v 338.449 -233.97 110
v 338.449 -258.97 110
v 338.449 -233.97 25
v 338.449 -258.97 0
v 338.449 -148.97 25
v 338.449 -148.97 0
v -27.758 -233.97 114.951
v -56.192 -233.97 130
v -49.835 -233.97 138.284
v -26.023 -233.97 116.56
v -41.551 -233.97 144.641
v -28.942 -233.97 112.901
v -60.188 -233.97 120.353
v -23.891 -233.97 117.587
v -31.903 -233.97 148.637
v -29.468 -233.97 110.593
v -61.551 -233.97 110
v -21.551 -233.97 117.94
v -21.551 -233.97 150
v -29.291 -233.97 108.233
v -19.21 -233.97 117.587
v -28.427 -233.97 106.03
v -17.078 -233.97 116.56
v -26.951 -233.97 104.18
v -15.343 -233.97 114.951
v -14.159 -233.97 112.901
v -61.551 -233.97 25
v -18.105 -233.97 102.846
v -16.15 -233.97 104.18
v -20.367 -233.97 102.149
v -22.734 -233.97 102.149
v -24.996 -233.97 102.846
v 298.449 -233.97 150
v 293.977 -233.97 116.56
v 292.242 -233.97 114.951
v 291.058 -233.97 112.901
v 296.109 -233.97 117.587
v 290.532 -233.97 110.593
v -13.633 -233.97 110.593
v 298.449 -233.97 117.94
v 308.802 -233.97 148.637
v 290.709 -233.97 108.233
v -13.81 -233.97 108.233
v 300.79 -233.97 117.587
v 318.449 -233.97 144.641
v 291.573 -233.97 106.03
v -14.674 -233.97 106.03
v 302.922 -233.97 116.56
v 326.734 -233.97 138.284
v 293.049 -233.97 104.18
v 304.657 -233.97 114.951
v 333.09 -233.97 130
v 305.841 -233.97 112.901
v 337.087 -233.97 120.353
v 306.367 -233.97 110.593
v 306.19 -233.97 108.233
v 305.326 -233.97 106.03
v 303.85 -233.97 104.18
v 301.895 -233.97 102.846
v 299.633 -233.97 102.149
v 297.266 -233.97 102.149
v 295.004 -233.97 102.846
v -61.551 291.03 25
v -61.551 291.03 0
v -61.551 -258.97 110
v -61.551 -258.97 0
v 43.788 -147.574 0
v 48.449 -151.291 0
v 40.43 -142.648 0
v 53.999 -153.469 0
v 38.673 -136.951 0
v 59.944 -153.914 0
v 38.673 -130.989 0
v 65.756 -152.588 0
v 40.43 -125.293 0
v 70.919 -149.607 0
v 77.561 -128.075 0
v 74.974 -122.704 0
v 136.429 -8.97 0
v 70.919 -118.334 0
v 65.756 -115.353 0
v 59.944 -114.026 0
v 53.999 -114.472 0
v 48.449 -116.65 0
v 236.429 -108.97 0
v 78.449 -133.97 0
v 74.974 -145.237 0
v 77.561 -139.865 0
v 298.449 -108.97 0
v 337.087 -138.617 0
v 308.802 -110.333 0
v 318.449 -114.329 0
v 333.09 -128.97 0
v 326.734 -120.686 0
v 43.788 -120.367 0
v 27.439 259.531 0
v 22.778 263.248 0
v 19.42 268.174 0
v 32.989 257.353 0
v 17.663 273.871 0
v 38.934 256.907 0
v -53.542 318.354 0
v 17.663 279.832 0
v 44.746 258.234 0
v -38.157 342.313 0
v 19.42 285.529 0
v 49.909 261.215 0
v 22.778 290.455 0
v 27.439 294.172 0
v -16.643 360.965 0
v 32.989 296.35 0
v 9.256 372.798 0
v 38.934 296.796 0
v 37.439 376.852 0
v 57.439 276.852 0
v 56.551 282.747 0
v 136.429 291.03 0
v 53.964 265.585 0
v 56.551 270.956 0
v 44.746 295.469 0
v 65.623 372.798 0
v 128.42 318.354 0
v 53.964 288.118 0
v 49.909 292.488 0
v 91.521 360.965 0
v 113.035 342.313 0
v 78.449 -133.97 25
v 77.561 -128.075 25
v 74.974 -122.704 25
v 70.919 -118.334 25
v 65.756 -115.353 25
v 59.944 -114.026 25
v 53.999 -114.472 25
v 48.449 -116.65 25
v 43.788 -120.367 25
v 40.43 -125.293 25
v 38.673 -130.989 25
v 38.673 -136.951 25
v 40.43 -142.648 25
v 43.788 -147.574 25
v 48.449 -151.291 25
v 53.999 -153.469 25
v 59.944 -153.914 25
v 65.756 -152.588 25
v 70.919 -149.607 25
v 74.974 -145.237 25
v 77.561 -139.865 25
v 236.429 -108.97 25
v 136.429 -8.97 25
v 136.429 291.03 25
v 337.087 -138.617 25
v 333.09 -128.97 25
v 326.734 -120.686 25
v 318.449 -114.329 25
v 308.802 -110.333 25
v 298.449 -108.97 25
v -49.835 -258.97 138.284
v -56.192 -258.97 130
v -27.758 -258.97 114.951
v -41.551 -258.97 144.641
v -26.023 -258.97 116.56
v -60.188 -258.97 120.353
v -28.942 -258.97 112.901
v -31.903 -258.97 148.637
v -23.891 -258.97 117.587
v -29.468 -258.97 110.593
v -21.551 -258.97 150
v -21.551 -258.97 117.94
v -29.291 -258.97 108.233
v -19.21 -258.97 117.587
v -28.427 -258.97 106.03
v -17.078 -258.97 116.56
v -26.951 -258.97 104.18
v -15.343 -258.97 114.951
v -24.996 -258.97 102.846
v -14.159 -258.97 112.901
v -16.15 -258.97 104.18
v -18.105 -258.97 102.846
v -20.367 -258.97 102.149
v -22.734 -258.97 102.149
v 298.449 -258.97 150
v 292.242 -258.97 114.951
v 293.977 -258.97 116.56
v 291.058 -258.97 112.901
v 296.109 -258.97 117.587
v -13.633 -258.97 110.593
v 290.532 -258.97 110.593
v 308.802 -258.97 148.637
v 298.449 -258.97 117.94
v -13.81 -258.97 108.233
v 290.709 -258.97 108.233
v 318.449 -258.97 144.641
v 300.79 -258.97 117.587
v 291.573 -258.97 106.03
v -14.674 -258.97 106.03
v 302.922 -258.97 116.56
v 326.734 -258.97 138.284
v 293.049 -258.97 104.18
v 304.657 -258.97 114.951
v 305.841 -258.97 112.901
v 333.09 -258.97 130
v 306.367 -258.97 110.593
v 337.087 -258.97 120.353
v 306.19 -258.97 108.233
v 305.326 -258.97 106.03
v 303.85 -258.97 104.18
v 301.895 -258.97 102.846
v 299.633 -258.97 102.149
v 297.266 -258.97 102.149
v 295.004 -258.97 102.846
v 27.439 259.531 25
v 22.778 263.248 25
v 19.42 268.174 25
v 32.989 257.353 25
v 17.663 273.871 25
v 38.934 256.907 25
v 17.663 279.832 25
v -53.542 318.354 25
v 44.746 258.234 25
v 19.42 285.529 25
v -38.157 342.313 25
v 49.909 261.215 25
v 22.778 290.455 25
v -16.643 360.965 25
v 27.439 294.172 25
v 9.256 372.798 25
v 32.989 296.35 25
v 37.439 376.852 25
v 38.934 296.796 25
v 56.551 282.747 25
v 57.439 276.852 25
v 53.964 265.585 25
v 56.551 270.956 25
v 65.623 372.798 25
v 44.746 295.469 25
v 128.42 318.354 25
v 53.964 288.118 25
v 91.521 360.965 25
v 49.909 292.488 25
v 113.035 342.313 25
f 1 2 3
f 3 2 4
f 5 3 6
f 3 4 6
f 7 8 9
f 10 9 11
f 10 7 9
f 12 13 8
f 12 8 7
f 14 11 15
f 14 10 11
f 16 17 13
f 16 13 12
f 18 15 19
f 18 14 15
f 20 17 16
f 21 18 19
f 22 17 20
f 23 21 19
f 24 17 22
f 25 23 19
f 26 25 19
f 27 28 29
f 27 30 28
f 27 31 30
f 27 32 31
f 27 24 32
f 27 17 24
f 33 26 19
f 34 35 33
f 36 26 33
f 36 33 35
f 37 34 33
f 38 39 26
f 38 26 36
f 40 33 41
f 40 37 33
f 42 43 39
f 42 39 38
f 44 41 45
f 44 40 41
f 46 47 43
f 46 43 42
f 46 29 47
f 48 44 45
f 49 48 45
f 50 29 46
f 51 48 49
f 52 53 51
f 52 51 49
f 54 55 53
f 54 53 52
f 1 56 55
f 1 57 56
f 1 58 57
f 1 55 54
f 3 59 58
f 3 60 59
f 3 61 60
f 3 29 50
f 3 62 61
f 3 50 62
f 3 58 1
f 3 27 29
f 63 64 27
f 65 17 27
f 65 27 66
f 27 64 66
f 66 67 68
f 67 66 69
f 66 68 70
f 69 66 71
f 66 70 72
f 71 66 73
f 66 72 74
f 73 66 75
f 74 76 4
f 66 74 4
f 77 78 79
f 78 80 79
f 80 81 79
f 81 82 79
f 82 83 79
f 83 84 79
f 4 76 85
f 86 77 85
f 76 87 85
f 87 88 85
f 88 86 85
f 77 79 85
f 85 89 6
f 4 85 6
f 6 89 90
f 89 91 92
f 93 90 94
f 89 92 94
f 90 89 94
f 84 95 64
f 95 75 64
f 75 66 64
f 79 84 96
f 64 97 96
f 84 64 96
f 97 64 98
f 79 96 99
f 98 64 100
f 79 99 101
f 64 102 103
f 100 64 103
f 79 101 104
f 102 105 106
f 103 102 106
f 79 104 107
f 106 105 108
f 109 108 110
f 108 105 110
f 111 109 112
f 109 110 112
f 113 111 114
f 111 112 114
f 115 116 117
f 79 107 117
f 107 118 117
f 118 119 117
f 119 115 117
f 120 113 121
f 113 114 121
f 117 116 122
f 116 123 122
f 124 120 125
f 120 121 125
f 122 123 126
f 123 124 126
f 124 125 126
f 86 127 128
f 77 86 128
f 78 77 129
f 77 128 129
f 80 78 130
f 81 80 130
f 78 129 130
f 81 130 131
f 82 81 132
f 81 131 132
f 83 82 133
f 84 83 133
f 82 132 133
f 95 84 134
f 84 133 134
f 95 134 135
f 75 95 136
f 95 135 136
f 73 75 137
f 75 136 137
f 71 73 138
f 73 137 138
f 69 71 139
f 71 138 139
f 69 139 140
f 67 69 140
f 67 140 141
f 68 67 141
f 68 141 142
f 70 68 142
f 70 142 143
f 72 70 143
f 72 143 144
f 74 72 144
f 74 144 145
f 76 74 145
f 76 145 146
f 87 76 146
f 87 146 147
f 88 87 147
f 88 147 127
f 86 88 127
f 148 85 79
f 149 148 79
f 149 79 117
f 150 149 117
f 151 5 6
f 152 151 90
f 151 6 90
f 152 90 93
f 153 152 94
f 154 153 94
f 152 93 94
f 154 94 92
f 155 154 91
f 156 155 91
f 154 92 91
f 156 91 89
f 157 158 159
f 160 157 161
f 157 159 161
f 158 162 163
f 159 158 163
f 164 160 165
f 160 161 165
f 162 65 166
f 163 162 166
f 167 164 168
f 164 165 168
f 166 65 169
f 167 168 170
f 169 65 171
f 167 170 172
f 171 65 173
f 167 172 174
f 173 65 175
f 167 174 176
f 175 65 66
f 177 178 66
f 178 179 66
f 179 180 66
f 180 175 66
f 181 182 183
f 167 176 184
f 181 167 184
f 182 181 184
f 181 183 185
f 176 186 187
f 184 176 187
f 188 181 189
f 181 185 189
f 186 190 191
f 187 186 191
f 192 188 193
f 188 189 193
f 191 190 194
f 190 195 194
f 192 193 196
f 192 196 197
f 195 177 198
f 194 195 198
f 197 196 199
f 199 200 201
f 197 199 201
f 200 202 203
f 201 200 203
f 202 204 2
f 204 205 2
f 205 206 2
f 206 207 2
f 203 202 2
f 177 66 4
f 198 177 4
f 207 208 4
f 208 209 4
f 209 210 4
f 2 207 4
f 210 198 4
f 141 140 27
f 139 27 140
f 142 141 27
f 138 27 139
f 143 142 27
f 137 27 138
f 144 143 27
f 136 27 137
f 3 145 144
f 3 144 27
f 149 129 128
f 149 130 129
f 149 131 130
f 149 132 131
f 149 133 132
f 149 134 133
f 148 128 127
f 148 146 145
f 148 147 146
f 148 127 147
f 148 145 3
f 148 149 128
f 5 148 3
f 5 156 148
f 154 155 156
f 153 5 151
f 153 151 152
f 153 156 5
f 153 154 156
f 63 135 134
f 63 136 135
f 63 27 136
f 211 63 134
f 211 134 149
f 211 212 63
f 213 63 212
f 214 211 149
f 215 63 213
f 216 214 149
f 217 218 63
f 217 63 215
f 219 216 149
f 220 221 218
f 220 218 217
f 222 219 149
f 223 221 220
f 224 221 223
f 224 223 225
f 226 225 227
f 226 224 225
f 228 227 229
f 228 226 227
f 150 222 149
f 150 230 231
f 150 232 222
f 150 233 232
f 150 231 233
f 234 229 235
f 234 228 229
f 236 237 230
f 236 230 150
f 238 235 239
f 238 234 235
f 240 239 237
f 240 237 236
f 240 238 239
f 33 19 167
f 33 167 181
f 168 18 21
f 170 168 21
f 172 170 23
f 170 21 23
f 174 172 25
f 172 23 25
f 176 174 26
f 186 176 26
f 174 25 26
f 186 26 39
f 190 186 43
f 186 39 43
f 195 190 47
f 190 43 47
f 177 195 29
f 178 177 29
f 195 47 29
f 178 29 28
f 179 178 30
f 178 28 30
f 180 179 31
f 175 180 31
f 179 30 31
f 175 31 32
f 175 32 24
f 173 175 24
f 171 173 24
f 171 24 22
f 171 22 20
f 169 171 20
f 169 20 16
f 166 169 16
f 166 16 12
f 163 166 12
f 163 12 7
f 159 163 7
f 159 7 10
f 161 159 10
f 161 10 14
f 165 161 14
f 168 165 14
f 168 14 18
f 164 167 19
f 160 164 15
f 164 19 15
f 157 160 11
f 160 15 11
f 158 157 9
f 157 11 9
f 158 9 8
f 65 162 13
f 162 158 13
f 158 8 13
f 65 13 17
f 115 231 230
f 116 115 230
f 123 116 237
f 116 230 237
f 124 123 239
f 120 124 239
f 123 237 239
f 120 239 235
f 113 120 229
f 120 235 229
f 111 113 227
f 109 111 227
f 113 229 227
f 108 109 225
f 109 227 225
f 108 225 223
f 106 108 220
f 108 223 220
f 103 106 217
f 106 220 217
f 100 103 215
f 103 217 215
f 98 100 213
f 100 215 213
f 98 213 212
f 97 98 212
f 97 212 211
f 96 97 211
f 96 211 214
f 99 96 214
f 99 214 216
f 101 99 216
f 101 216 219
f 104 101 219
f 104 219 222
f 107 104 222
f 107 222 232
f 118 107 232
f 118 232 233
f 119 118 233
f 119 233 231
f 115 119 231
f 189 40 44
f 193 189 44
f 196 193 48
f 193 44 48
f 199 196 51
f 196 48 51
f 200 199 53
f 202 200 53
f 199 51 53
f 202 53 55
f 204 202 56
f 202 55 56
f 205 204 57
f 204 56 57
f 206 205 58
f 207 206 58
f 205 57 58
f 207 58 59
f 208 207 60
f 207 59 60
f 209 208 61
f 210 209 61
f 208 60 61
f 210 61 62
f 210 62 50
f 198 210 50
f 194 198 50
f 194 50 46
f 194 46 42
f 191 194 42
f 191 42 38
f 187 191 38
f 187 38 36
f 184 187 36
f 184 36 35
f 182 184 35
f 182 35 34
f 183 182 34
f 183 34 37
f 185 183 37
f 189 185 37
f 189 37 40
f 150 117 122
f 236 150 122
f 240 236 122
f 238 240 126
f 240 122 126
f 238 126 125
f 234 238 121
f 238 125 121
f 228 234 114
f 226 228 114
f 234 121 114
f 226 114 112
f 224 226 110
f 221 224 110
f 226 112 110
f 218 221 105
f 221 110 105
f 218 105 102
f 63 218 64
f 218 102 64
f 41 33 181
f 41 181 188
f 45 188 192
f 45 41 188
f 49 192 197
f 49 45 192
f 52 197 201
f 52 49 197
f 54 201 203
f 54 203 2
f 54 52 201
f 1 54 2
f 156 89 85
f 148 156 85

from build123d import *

# Parameters (mm, degrees)
BOSS_EXTRUDE1_DEPTH = 25
SKETCH2_W           = 400
SKETCH2_H           = 25
BOSS_EXTRUDE2_DEPTH = 150
CUT_EXTRUDE1_DEPTH  = 150
SKETCH4_R           = 7.94
CUT_EXTRUDE2_DEPTH  = 150
SKETCH5_R           = 20
CUT_EXTRUDE3_DEPTH  = 150


with BuildPart() as part:
    # Sketch1 → Boss-Extrude1 (new body)
    with BuildSketch(Plane.XY):
        with BuildLine():
            Line((-61.550518812, -258.970259643), (338.449481188, -258.970259643))
            Line((338.449481188, -258.970259643), (338.449481188, -148.970259643))
            ThreePointArc((338.449481188, -148.970259643), (326.733752435, -120.685988396), (298.449481188, -108.970259643))
            Line((298.449481188, -108.970259643), (236.429070899, -108.970259643))
            Line((236.429070899, -108.970259643), (136.429070899, -8.970259643))
            Line((136.429070899, -8.970259643), (136.429070899, 291.029740357))
            ThreePointArc((136.429070899, 291.029740357), (37.439276043, 376.851570008), (-61.550518812, 291.029740357))
            Line((-61.550518812, 291.029740357), (-61.550518812, -258.970259643))
        make_face()
    extrude(amount=BOSS_EXTRUDE1_DEPTH)

    # Sketch2 → Boss-Extrude2 (add)
    with BuildSketch(Plane.XY):
        with Locations((138.449481188, -246.470259643)):
            Rectangle(SKETCH2_W, SKETCH2_H)
    extrude(amount=BOSS_EXTRUDE2_DEPTH)

    # Sketch3 → Cut-Extrude1 (cut)
    with BuildSketch(Plane(origin=(0, -233.970259643, 0), x_dir=(1, 0, 0), z_dir=(0, 1, 0))):
        with BuildLine():
            Line((338.449481188, -110), (338.449481188, -150))
            Line((338.449481188, -150), (298.449481188, -150))
            ThreePointArc((298.449481188, -150), (326.733752435, -138.284271247), (338.449481188, -110))
        make_face()
        with BuildLine():
            Line((-61.550518812, -110), (-61.550518812, -150))
            Line((-61.550518812, -150), (-21.550518812, -150))
            ThreePointArc((-21.550518812, -150), (-49.83479006, -138.284271247), (-61.550518812, -110))
        make_face()
    extrude(amount=-CUT_EXTRUDE1_DEPTH, mode=Mode.SUBTRACT)

    # Sketch4 → Cut-Extrude2 (cut)
    with BuildSketch(Plane(origin=(0, -233.970259643, 0), x_dir=(1, 0, 0), z_dir=(0, 1, 0))):
        with Locations(Location((-21.550518812, -110, 0), (0, 0, 270))):
            Circle(SKETCH4_R)
        with Locations(Location((298.449481188, -110, 0), (0, 0, 270))):
            Circle(SKETCH4_R)
    extrude(amount=-CUT_EXTRUDE2_DEPTH, mode=Mode.SUBTRACT)

    # Sketch5 → Cut-Extrude3 (cut)
    with BuildSketch(Plane.XY.offset(25)):
        with Locations((37.439276043, 276.851570008)):
            Circle(SKETCH5_R)
        with Locations((58.449481188, -133.970259643)):
            Circle(SKETCH5_R)
    extrude(amount=-CUT_EXTRUDE3_DEPTH, mode=Mode.SUBTRACT)


solid = part.part
